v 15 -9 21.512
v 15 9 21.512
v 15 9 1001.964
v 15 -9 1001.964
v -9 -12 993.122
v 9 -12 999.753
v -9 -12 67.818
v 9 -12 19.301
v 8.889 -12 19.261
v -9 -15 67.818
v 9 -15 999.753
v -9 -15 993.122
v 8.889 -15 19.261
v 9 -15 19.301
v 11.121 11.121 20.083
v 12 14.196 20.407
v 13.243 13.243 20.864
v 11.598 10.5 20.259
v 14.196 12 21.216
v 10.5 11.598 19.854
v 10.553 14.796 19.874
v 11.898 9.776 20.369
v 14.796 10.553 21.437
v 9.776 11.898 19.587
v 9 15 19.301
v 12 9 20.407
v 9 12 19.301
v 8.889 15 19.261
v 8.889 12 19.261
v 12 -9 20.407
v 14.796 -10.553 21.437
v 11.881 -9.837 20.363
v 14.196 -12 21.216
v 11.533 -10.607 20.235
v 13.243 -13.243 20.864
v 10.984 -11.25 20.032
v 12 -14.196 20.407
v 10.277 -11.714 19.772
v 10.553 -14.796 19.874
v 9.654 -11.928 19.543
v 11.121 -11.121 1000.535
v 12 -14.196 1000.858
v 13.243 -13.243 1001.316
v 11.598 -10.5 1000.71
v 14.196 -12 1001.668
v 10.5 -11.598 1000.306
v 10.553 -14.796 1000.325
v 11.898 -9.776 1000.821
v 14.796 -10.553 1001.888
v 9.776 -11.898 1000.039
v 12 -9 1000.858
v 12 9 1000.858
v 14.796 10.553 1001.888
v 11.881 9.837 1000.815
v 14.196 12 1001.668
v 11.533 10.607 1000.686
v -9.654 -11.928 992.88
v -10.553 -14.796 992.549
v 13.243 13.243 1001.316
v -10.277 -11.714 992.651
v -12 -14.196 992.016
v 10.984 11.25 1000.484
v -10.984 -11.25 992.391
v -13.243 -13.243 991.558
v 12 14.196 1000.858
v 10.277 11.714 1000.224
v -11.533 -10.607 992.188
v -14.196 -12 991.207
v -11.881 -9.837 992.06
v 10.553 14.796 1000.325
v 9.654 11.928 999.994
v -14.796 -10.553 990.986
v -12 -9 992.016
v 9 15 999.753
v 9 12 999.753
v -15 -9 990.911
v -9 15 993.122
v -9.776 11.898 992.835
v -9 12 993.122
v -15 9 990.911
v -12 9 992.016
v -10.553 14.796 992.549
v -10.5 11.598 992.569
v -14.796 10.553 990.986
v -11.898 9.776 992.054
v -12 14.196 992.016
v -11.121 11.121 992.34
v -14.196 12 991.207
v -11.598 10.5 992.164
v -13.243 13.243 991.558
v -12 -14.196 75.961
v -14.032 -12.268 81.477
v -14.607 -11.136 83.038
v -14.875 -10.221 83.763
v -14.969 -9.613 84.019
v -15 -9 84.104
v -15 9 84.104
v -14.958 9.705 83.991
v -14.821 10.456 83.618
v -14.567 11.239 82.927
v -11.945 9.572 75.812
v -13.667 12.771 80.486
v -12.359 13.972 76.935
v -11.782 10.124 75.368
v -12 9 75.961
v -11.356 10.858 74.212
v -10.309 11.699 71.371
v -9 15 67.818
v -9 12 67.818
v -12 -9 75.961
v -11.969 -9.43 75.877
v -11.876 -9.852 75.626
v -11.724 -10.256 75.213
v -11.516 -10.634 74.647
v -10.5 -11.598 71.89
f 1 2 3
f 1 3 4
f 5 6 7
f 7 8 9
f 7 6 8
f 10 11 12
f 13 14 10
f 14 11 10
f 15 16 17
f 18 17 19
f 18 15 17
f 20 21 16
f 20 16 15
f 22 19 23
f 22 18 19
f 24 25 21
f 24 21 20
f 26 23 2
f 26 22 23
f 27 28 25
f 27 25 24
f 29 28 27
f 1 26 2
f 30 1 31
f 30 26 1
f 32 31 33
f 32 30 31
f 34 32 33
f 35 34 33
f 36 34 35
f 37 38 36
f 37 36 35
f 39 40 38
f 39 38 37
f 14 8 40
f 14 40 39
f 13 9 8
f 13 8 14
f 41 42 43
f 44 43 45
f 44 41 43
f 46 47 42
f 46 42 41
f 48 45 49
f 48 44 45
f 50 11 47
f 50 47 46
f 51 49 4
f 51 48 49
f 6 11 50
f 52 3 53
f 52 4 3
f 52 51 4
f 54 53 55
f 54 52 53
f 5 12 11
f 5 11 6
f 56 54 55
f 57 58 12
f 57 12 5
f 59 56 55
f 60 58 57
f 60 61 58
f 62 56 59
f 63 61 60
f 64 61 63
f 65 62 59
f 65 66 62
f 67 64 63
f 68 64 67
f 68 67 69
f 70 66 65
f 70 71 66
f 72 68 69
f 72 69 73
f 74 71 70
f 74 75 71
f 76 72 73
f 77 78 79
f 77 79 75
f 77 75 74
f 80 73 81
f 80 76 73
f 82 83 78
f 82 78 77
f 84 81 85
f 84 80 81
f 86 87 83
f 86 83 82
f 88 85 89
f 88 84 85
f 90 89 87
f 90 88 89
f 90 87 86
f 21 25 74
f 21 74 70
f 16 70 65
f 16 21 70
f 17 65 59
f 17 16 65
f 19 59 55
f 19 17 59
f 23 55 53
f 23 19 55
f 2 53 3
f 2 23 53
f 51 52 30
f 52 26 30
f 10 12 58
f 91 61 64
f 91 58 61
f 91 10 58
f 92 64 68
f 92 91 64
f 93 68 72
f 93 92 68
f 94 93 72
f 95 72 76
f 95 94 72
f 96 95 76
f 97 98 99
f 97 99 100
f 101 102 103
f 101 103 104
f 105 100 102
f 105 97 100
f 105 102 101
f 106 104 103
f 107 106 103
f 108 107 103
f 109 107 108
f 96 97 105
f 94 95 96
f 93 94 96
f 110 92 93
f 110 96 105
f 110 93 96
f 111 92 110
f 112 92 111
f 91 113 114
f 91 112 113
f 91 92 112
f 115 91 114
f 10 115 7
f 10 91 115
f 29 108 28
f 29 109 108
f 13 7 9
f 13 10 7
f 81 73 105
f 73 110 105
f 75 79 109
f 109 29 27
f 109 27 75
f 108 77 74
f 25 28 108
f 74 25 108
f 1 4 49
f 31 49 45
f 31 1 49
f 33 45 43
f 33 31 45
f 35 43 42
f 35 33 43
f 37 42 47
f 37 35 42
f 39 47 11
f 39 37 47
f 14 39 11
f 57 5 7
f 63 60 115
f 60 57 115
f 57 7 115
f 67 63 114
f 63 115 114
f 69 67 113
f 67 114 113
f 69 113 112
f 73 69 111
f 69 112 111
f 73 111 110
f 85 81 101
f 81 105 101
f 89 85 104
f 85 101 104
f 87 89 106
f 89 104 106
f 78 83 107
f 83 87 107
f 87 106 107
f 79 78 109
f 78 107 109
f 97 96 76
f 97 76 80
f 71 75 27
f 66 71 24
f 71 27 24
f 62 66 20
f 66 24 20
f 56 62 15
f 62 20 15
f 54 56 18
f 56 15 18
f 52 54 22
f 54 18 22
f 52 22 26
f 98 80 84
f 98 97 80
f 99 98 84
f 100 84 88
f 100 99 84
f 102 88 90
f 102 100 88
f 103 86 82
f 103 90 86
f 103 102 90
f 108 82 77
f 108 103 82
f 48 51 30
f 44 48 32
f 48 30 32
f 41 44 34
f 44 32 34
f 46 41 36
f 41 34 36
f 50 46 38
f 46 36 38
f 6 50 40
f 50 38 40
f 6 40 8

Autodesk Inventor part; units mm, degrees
ref_plane "Start Plane" through (0, 0, 19.2607) normal (0, 0, 1) x (1, 0, 0)
ref_plane "End Plane" through (0, 0, 1001.9635) normal (0, 0, 1) x (1, 0, 0)
sketch "Sketch" plane through (0, 0, 0) normal (0, 0, 1) x (1, 0, 0)
  line L0 (-15, -9) -> (-15, 9)
  line L1 (-9, 15) -> (9, 15)
  line L2 (15, 9) -> (15, -9)
  line L3 (9, -15) -> (-9, -15)
  arc A0 (-15, -9) -> (-9, -15) centre (-9, -9) ccw
  arc A1 (-9, 15) -> (-15, 9) centre (-9, 9) ccw
  arc A2 (15, 9) -> (9, 15) centre (9, 9) ccw
  arc A3 (9, -15) -> (15, -9) centre (9, -9) ccw
  arc A4 (-9, 12) -> (-12, 9) centre (-9, 9) ccw
  line L4 (-9, 12) -> (9, 12)
  arc A5 (12, 9) -> (9, 12) centre (9, 9) ccw
  line L5 (12, 9) -> (12, -9)
  arc A6 (9, -12) -> (12, -9) centre (9, -9) ccw
  line L6 (9, -12) -> (-9, -12)
  arc A7 (-12, -9) -> (-9, -12) centre (-9, -9) ccw
  line L7 (-12, -9) -> (-12, 9)
  line L8 (0, 22.7397) -> (0, -22.7397) construction
  line L9 (-22.7397, 0) -> (22.7397, 0) construction
  dimension "d7" = 6
  dimension "d10" = 30
  dimension "d11" = 30
  dimension "d12" = 3
  dimension "d15" = 15
  dimension "d16" = 15
extrude "Body" add sketch "Sketch" along normal up to surface (982.7028 mm away) from surface at 19.2607
sketch "Sketch3" plane through (0, 0, 0) normal (0, 0, 1) x (1, 0, 0)
  line L0 (0, 0) -> (10, 0)
ref_plane "Work Plane3" through (0, 0, 0) normal (0, -1, 0) x (1, 0, 0)
ref_plane "Work Plane4" through (-2322.8437, 0, 140.6527) normal (-0.3457054, 0, 0.9383431) x (0.9383431, 0, 0.3457054)
split "Split1" plane through (-2322.8437, 0, 140.6527) removes the side toward (-0.3457054, 0, 0.9383431)
ref_plane "Work Plane5" through (-380.5228, 991, -124.207) normal (0.3457054, 0, -0.9383431) x (-0.9383431, 0, -0.3457054)
split "Split2" plane through (-380.5228, 991, -124.207) removes the side toward (0.3457054, 0, -0.9383431)
ref_plane "Work Plane6" through (-314.3449, -9, 896.6115) normal (-0.9383431, 0, -0.3457054) x (-0.3457054, 0, 0.9383431)
split "Split3" plane through (-314.3449, -9, 896.6115) removes the side toward (-0.9383431, 0, -0.3457054)
sketch "Sketch4" plane through (0, 0, 0) normal (0, -1, 0) x (1, 0, 0)
  line L0 (-2, 19.2607) -> (12, 19.2607) projected
  line L1 (-2, 1001.9635) -> (12, 1001.9635) projected
  dimension "d18" = 982.7028
equation "\"d7\" = G_IR"
equation "\"d10\" = G_H"
equation "\"d11\" = G_W"
equation "\"d12\" = G_T"
equation "\"d15\" = 0.5 * d10"
equation "\"d16\" = 0.5 * d11"
equation "\"d3\" = G_L"
equation "\"G_W\" = 30"
equation "\"G_H\" = 30"
equation "\"G_T\" = 3"
equation "\"G_IR\" = 6"
equation "\"G_L\" = d18"
equation "\"G_OFFSET_START\" = -19.26073"
equation "\"G_OFFSET_END\" = -10.45931"
equation "\"d13\" = -G_OFFSET_START"
equation "\"d14\" = G_OFFSET_END + B_L"
equation "\"B_L\" = 1012.42284"
properties part number "DIN EN 10219-2 - 30 x 30 x 3  - 982.7" material "Steel, Mild"
